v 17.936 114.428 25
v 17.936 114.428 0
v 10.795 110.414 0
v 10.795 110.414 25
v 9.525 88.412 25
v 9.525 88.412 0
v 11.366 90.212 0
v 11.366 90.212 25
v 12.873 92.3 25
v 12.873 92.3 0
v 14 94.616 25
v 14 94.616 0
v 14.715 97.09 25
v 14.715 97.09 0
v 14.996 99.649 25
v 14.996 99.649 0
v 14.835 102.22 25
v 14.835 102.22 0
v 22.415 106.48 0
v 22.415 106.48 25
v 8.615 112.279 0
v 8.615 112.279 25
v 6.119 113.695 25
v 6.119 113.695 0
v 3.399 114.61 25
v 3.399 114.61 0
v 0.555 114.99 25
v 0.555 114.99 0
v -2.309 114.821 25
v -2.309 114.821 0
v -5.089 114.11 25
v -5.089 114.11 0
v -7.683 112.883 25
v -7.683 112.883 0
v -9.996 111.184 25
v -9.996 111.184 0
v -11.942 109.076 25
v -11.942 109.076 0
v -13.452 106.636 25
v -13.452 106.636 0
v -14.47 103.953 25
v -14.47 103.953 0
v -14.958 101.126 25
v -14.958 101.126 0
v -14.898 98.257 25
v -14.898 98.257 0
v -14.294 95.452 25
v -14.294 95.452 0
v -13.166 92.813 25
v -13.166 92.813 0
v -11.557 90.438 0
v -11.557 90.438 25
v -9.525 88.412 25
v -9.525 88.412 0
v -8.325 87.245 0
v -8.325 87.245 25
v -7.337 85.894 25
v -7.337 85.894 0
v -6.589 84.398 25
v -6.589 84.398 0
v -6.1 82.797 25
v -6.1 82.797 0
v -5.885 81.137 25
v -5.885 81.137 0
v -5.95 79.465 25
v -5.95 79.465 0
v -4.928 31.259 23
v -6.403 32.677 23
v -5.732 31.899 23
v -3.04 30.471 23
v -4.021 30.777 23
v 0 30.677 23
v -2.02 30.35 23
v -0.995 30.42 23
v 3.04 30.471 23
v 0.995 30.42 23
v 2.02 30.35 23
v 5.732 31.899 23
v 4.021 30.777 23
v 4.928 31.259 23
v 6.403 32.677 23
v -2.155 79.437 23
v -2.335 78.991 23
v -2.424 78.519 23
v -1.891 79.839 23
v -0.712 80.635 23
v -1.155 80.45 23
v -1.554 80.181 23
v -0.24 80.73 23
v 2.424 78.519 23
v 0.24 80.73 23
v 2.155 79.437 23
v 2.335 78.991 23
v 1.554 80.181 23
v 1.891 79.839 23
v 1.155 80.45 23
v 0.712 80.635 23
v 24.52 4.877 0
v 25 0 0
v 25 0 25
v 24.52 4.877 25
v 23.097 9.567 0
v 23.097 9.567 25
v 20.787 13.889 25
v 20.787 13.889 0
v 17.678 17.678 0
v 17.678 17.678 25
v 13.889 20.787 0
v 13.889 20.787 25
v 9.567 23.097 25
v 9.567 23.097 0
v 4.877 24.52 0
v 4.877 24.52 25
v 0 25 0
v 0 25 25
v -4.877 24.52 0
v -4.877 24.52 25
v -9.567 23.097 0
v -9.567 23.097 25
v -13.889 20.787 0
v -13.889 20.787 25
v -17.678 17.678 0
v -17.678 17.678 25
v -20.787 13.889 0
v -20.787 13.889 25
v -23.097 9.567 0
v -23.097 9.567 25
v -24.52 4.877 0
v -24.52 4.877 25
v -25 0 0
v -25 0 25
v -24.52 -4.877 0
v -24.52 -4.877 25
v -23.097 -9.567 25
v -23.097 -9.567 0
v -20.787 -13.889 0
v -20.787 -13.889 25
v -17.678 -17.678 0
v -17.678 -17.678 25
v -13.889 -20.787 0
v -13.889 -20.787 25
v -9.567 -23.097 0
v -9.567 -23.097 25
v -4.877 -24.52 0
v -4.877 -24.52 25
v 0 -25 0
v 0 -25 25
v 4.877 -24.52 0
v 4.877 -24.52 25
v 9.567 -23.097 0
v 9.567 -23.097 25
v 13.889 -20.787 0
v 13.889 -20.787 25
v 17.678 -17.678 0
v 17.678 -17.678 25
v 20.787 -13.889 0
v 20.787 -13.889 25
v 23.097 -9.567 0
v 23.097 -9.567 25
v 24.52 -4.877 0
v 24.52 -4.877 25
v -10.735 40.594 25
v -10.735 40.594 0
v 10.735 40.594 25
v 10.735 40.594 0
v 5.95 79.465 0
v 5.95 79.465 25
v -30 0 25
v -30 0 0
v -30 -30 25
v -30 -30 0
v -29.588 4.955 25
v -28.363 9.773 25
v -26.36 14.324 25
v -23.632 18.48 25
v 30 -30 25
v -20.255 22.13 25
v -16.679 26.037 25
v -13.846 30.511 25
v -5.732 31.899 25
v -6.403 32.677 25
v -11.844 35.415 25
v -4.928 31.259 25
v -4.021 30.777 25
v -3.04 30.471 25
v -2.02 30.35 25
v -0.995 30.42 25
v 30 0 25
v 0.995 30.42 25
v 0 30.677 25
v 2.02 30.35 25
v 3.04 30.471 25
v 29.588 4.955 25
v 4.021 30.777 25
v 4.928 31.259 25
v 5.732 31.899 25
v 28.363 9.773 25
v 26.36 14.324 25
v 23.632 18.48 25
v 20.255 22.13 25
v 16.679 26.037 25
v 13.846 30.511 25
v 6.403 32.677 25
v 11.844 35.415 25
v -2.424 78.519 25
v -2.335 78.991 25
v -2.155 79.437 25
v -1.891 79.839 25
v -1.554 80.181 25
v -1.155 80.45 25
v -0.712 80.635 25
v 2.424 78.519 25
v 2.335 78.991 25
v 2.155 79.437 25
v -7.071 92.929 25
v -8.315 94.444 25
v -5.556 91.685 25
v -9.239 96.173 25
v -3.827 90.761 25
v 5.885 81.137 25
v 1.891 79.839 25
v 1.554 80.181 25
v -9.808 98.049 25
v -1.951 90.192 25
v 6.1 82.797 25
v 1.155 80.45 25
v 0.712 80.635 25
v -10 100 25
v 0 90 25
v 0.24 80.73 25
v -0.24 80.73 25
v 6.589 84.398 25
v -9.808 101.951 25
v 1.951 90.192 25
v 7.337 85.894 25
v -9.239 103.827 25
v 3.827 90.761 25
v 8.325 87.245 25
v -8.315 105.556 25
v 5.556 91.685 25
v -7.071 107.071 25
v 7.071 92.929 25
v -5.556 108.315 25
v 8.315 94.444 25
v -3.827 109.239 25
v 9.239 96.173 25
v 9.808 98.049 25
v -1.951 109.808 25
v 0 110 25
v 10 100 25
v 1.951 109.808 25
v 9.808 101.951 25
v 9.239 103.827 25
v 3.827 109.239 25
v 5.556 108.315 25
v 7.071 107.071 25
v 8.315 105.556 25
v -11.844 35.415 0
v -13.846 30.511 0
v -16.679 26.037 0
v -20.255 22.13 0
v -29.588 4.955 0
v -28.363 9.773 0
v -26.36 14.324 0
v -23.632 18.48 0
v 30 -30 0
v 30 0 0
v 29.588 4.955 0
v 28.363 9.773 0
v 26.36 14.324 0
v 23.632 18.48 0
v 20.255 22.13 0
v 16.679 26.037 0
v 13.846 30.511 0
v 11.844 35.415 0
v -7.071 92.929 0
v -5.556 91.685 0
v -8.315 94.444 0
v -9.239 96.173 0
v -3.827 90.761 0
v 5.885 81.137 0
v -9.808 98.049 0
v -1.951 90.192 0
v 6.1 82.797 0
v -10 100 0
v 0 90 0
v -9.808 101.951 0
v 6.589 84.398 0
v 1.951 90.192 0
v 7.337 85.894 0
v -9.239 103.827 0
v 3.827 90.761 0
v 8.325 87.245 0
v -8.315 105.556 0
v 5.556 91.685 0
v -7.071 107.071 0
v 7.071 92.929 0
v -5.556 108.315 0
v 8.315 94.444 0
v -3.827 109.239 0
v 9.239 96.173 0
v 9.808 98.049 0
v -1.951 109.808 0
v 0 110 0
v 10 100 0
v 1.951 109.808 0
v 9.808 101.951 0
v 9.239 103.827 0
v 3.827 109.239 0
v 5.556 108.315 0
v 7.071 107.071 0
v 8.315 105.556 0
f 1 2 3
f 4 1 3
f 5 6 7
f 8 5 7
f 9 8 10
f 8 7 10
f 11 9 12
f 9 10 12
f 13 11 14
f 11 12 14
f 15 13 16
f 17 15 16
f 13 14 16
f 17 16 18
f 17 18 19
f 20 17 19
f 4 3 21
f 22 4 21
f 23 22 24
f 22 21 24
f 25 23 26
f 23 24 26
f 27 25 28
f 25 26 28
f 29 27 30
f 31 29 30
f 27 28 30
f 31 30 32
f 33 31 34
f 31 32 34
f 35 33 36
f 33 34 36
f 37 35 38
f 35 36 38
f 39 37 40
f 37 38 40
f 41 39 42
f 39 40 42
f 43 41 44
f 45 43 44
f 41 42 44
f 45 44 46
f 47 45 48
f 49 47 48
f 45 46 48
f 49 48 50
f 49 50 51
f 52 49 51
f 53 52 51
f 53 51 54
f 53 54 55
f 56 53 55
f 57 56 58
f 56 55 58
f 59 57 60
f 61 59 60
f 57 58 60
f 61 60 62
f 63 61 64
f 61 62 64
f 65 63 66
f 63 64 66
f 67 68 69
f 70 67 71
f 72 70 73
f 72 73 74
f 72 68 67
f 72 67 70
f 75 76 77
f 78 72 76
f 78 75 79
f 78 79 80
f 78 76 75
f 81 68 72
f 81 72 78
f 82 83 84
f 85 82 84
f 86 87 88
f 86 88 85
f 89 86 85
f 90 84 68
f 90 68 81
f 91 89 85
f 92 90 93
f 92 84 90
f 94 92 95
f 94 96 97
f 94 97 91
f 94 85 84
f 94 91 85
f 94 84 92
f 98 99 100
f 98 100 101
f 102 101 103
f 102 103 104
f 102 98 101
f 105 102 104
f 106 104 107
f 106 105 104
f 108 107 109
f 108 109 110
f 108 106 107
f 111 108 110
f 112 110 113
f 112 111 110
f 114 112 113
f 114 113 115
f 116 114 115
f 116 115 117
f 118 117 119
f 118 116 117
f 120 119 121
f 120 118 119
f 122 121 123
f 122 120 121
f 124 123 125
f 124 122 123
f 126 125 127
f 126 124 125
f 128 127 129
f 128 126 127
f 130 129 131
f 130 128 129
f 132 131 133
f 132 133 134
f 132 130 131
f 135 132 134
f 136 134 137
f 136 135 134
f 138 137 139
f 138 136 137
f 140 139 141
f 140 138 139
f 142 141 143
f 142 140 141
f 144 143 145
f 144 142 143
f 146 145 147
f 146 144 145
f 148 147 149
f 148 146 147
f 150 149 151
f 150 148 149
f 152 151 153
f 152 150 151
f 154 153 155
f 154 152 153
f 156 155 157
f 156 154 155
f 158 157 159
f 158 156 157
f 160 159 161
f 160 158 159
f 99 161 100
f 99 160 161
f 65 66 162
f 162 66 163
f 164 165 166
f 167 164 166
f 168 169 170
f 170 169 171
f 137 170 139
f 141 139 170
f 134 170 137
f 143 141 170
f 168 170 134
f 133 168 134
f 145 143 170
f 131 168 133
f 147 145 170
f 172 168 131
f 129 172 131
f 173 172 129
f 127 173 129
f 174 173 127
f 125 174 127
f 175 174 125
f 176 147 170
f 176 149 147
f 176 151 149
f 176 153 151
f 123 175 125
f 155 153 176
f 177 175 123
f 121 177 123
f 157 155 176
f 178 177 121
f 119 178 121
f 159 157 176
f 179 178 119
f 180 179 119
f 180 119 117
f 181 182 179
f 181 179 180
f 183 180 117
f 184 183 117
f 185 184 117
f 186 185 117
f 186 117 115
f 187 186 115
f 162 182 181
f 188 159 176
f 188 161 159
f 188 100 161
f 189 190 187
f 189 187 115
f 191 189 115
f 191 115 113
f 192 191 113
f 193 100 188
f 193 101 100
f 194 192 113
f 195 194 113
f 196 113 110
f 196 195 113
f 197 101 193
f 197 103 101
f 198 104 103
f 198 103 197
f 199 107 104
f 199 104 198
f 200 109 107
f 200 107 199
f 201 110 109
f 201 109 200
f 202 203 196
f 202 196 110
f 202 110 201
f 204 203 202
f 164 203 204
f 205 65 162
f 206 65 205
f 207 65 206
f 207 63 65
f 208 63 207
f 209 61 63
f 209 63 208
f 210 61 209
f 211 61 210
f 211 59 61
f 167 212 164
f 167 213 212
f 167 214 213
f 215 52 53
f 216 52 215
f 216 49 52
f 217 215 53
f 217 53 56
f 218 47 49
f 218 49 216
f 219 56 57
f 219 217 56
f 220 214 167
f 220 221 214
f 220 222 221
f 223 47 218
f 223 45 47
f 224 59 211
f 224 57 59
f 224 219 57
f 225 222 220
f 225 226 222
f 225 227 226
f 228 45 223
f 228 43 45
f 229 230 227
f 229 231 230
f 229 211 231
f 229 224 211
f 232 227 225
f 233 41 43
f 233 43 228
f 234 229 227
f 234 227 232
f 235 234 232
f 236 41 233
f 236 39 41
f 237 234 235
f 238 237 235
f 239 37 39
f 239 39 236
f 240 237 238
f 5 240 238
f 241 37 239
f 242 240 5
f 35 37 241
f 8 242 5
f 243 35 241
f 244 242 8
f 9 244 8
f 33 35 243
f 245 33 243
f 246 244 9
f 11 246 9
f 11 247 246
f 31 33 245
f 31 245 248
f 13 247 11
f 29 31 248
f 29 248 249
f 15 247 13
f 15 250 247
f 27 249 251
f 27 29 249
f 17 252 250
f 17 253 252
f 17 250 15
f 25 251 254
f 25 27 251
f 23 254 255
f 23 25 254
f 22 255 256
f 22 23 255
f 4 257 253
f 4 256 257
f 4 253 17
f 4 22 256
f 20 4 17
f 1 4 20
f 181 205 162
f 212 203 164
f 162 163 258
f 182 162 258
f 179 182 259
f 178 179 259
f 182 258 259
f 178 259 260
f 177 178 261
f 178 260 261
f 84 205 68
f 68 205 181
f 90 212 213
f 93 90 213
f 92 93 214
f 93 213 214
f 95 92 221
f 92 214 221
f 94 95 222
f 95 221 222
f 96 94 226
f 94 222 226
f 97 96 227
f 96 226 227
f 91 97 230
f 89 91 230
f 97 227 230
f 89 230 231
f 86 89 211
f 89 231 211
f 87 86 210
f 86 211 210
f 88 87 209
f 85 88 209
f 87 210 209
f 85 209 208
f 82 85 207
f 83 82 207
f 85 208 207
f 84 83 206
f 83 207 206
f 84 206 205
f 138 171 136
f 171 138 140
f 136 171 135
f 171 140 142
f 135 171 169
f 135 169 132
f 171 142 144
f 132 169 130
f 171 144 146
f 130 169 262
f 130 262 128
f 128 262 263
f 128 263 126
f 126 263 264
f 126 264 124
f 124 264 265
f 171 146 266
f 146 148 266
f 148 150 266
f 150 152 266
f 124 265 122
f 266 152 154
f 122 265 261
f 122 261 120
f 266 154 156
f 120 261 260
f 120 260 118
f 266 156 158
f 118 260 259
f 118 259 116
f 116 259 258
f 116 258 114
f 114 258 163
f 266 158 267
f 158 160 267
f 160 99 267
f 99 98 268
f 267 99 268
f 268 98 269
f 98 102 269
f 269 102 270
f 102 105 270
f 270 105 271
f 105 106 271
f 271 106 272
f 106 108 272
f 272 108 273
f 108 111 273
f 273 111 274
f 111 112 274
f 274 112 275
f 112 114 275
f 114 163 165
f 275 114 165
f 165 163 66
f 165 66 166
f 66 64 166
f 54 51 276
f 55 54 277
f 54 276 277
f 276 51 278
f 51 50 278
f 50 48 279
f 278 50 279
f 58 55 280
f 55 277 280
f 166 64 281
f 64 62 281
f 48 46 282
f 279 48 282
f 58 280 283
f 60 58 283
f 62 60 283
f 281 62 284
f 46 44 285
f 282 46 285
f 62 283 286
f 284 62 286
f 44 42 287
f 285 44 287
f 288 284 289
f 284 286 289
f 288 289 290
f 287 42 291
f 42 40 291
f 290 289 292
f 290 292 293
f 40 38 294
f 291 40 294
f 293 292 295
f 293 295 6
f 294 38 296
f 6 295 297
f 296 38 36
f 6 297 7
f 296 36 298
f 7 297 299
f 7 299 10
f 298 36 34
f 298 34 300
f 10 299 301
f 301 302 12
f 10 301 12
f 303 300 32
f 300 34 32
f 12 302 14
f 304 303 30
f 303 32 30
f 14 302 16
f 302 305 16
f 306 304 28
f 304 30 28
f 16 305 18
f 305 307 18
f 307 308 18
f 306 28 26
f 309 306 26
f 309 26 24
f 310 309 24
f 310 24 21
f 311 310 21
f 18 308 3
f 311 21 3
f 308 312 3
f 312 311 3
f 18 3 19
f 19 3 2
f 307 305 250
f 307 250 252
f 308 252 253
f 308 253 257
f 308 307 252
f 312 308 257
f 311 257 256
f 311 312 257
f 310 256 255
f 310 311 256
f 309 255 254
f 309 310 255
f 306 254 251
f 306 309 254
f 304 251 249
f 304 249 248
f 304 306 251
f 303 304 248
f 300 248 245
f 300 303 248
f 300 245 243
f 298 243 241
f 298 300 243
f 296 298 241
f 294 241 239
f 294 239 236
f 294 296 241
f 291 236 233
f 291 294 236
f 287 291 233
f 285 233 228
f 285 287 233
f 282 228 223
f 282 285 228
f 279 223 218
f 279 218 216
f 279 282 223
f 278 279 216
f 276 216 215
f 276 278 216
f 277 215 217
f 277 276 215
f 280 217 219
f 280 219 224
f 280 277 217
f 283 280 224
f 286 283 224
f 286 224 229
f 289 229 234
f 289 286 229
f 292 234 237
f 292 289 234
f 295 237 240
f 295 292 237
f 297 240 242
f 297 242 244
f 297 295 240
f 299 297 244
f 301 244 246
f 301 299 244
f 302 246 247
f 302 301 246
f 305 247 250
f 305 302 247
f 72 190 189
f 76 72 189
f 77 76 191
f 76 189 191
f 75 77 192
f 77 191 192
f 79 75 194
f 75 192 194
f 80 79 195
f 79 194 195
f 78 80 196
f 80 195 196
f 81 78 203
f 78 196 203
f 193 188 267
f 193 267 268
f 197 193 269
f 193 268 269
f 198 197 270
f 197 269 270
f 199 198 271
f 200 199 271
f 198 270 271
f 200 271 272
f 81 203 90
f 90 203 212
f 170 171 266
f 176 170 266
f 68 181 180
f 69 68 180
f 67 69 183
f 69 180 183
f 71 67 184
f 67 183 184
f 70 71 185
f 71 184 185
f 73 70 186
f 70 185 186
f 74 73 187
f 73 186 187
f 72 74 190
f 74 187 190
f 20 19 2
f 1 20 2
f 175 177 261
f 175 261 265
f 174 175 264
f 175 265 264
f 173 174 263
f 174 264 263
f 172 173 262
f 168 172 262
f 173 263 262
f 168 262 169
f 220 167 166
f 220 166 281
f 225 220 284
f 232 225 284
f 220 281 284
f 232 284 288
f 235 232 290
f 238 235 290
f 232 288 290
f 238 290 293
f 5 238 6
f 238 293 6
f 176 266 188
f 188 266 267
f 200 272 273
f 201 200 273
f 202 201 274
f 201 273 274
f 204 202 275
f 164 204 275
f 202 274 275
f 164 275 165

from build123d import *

# Parameters (mm, degrees)
SKETCH1_R           = 25
SKETCH1_R_2         = 10
BOSS_EXTRUDE1_DEPTH = 25
CUT_EXTRUDE1_DEPTH  = 2


with BuildPart() as part:
    # Sketch1 → Boss-Extrude1 (new body)
    with BuildSketch(Plane.XY):
        with BuildLine():
            Line((-5.9495669, 79.464935133), (-10.735337561, 40.593572422))
            ThreePointArc((-10.735337561, 40.593572422), (-13.846128401, 30.51133724), (-20.2552595, 22.12971899))
            ThreePointArc((-20.2552595, 22.12971899), (-27.455944575, 12.090124379), (-30, 0))
            Line((-30, 0), (-30, -30))
            Line((-30, -30), (30, -30))
            Line((30, -30), (30, 0))
            ThreePointArc((30, 0), (27.455944575, 12.090124379), (20.2552595, 22.12971899))
            ThreePointArc((20.2552595, 22.12971899), (13.846128401, 30.51133724), (10.735337561, 40.593572422))
            Line((10.735337561, 40.593572422), (5.9495669, 79.464935133))
            ThreePointArc((5.9495669, 79.464935133), (6.588547568, 84.397513141), (9.524776428, 88.412134191))
            ThreePointArc((9.524776428, 88.412134191), (14.000335083, 94.615706401), (14.834877403, 102.219552307))
            Line((14.834877403, 102.219552307), (22.415220632, 106.480398828))
            Line((22.415220632, 106.480398828), (17.935698756, 114.427937641))
            Line((17.935698756, 114.427937641), (10.795365576, 110.41441703))
            ThreePointArc((10.795365576, 110.41441703), (-11.019469666, 110.176997999), (-9.524776428, 88.412134191))
            ThreePointArc((-9.524776428, 88.412134191), (-6.588547568, 84.397513141), (-5.9495669, 79.464935133))
        make_face()
        Circle(SKETCH1_R, mode=Mode.SUBTRACT)
        with Locations((0, 100)):
            Circle(SKETCH1_R_2, mode=Mode.SUBTRACT)
    extrude(amount=BOSS_EXTRUDE1_DEPTH)

    # Sketch2 → Cut-Extrude1 (cut)
    with BuildSketch(Plane.XY.offset(25)):
        with BuildLine():
            Line((-2.424018912, 78.51885418), (-6.403368912, 32.676732655))
            ThreePointArc((-6.403368912, 32.676732655), (-3.537609758, 30.601194917), (0, 30.677021255))
            ThreePointArc((0, 30.677021255), (3.537609758, 30.601194917), (6.403368912, 32.676732655))
            Line((6.403368912, 32.676732655), (2.424018912, 78.51885418))
            ThreePointArc((2.424018912, 78.51885418), (0, 80.741469231), (-2.424018912, 78.51885418))
        make_face()
    extrude(amount=-CUT_EXTRUDE1_DEPTH, mode=Mode.SUBTRACT)


solid = part.part
